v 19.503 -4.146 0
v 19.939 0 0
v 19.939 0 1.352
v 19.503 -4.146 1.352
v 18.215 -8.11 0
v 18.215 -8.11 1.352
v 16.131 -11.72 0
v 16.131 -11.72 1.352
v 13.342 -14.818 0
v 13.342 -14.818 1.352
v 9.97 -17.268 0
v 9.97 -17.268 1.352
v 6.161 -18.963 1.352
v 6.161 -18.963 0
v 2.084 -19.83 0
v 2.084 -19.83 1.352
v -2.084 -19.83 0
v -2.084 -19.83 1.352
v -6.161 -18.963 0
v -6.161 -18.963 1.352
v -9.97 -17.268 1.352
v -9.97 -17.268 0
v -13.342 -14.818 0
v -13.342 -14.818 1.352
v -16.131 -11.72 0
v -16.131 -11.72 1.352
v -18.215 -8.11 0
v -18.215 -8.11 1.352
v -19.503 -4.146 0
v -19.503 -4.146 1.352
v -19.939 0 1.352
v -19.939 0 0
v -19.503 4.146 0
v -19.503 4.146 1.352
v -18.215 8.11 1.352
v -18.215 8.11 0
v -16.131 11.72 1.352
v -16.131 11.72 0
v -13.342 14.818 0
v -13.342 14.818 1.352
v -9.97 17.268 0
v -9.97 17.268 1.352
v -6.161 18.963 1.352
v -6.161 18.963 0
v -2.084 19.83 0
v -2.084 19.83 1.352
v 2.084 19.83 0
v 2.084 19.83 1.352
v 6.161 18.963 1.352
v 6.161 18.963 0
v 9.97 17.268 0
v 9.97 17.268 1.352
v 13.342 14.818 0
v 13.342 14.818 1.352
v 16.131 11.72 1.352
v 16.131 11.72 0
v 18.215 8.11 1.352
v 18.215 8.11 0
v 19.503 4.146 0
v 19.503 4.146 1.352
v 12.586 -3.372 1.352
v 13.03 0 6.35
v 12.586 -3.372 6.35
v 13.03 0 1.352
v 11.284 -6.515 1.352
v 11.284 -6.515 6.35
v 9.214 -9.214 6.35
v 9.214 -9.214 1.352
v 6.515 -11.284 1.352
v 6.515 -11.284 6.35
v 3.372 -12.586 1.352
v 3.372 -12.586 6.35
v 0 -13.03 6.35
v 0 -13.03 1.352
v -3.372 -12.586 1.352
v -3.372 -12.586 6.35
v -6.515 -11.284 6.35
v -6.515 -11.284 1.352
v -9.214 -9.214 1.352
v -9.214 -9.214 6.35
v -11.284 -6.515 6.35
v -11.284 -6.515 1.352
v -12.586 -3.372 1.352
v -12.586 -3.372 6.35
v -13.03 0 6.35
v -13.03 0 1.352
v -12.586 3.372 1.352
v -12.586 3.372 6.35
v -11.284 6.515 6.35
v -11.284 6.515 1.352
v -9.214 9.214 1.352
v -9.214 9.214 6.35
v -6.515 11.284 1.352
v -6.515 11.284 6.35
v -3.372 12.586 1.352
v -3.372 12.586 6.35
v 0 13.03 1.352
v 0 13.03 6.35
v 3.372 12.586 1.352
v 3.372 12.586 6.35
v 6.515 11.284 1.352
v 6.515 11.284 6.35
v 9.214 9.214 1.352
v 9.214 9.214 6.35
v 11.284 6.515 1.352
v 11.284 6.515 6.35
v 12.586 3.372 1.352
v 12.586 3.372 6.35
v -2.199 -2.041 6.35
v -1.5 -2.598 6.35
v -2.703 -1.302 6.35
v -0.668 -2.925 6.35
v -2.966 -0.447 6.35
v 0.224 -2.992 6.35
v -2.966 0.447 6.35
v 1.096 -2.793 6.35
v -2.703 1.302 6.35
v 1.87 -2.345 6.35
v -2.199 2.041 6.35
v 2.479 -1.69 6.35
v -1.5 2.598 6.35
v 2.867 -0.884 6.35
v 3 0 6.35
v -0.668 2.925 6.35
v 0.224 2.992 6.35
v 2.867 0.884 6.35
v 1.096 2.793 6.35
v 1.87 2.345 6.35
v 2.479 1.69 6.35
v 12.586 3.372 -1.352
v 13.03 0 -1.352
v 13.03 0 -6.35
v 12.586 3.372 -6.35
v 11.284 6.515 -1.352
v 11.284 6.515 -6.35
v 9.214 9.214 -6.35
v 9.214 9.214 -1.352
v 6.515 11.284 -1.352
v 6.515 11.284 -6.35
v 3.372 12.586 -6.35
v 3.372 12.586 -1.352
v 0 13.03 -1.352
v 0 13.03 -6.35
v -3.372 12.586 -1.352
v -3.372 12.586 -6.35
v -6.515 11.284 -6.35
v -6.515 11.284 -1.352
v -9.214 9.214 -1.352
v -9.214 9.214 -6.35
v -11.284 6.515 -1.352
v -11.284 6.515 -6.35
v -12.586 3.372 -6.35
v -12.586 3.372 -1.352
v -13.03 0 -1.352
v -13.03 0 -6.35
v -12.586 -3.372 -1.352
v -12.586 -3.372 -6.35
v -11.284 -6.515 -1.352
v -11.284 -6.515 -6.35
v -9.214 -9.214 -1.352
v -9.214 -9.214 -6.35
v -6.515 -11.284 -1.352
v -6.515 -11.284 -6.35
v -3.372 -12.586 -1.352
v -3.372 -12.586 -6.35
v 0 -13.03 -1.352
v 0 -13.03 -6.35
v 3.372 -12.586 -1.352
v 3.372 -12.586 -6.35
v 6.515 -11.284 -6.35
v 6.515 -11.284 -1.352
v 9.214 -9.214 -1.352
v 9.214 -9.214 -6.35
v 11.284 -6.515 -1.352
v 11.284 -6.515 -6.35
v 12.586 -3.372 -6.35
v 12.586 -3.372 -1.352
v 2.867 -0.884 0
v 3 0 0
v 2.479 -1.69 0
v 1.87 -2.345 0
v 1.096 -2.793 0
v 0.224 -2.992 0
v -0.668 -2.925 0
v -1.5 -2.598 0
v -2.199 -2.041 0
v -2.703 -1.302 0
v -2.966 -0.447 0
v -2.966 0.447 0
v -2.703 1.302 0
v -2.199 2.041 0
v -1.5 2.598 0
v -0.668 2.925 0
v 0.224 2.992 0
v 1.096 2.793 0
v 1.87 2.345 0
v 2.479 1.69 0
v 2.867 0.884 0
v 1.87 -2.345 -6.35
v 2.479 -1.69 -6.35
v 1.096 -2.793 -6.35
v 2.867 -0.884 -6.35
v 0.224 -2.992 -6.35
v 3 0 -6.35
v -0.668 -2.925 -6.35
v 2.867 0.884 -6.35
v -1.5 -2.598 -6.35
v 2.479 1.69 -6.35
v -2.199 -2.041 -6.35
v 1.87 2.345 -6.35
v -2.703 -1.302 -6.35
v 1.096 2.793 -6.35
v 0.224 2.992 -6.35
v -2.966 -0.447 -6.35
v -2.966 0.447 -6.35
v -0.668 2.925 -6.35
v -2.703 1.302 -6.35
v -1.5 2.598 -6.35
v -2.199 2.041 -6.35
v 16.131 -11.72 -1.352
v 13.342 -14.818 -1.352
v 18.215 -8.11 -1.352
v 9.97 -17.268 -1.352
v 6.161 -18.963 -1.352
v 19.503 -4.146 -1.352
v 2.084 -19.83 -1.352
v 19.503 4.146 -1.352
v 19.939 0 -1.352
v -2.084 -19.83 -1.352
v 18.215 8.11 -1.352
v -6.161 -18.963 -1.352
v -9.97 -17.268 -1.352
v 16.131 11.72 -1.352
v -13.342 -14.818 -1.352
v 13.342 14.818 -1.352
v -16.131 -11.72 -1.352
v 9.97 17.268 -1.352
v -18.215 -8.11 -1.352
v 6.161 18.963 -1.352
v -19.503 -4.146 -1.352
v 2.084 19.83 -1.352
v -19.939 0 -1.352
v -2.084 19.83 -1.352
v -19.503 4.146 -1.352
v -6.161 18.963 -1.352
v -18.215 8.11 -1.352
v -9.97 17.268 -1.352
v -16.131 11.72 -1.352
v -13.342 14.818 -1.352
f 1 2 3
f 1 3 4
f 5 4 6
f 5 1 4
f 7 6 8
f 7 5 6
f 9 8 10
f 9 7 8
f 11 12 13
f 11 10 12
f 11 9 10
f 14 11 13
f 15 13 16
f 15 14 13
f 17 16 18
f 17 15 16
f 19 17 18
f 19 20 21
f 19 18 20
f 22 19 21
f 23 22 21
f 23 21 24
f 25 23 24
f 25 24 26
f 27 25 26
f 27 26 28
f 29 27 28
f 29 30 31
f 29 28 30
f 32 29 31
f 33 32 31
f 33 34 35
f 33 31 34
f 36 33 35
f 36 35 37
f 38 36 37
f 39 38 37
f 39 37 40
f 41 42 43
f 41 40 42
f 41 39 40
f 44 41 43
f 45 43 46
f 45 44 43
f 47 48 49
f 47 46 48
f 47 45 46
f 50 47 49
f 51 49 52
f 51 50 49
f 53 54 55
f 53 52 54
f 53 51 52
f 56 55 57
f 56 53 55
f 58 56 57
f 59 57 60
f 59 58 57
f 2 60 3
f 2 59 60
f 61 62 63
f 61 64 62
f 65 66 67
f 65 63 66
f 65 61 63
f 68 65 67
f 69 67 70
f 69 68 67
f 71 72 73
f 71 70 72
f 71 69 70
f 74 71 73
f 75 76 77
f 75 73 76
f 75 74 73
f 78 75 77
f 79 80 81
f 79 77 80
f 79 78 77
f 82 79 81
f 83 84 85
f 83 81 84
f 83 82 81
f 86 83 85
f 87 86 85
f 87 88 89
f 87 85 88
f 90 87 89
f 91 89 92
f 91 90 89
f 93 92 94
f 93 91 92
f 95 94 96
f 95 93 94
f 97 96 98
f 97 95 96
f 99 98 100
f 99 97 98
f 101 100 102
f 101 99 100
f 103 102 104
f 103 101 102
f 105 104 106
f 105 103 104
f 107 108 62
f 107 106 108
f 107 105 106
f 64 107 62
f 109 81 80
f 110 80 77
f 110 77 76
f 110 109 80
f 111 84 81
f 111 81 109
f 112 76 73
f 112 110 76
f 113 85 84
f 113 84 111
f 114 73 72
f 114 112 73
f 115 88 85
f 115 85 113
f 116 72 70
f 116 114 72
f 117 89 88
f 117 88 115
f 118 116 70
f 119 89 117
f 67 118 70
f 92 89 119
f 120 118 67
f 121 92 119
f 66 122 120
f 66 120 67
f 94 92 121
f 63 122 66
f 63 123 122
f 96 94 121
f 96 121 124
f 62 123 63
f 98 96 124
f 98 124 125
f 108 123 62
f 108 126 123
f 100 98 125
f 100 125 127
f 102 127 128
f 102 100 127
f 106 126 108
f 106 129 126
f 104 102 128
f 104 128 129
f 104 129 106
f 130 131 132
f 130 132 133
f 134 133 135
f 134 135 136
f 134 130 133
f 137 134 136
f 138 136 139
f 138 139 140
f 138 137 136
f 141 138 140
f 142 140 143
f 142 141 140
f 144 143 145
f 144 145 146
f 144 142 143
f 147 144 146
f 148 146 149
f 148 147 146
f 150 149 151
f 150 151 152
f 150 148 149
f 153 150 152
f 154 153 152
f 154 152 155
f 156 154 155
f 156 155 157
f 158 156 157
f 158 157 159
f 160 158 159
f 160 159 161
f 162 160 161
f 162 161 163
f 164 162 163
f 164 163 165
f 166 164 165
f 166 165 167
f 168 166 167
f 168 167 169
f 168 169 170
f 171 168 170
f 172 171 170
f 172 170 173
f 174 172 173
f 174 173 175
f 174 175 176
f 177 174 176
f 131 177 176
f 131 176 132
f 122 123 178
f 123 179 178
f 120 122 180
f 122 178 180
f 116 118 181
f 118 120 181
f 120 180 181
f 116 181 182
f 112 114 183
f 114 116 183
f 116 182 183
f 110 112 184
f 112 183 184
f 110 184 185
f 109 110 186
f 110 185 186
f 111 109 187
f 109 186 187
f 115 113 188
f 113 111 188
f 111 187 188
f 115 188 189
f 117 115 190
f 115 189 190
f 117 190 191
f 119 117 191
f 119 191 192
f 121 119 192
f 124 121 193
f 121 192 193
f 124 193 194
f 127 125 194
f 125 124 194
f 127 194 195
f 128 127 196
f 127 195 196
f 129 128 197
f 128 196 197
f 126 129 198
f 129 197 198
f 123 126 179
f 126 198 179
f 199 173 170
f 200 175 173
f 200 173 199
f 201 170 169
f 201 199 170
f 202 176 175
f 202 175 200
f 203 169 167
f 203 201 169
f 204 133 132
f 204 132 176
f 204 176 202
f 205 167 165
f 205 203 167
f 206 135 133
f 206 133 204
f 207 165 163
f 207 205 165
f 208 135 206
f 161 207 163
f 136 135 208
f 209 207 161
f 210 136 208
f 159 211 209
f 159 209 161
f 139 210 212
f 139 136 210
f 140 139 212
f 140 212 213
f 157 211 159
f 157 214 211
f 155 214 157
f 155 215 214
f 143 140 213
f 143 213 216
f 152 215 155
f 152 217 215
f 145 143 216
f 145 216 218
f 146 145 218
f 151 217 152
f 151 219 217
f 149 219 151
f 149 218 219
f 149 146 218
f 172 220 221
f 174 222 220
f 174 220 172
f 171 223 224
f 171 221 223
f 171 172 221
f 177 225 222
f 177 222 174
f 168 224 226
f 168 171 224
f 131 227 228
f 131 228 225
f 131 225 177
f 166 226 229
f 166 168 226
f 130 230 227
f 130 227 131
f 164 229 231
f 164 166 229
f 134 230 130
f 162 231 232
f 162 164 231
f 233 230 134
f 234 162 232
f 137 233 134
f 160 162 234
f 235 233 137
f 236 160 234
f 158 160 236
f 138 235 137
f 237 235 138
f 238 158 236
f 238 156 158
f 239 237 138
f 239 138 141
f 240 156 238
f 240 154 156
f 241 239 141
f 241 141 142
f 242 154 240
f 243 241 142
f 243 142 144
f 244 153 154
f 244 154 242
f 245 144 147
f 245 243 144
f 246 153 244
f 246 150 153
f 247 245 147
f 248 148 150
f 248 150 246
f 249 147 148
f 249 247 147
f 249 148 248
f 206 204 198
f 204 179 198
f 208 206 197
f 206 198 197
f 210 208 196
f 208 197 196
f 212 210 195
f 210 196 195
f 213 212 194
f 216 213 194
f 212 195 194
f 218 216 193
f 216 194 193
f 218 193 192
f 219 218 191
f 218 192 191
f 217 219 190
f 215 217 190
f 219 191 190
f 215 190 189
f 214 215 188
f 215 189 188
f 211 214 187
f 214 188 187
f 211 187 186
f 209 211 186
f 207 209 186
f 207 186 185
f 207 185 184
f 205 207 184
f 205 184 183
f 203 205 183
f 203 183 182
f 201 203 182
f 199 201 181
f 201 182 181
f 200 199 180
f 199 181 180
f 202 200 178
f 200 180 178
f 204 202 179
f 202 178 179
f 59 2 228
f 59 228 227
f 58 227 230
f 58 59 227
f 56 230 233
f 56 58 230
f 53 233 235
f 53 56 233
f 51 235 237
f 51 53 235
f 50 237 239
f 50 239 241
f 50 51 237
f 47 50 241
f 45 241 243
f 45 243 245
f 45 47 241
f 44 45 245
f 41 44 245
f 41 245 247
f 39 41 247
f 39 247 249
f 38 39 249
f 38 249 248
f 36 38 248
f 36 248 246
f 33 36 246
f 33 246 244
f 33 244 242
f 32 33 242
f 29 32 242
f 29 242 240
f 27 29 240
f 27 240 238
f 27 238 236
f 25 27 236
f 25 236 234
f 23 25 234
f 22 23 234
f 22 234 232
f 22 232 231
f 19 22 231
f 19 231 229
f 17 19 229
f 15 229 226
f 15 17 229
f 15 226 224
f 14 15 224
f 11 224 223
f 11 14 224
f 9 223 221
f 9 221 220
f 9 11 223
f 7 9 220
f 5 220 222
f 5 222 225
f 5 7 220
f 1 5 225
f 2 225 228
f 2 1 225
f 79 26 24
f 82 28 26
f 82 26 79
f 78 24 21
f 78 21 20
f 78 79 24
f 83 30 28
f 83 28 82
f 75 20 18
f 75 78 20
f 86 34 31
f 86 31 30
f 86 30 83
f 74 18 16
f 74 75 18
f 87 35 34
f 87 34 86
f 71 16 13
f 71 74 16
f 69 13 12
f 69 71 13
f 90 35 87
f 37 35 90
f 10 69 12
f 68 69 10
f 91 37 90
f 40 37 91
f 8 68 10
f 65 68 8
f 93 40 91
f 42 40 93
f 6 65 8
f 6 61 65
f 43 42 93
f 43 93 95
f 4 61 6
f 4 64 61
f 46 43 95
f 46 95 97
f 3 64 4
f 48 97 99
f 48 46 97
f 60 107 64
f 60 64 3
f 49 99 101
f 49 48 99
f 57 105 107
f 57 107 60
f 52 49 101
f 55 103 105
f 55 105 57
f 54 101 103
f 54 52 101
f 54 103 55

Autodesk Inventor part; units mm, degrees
ref_plane "YZ Plane" through (0, 0, 0) normal (1, 0, 0) x (0, 1, 0)
ref_plane "XZ Plane" through (0, 0, 0) normal (0, 1, 0) x (-1, 0, 0)
ref_plane "XY Plane" through (0, 0, 0) normal (0, 0, 1) x (1, 0, 0)
sketch "Sketch1" plane through (0, 0, 0) normal (0, 0, 1) x (1, 0, 0)
  circle A0 centre (0, 0) radius 13.0302
  circle A1 centre (0, 0) radius 3
  circle A2 centre (0, 0) radius 19.939
  dimension "d0" = 26.0604
  dimension "d1" = 6
  dimension "d2" = 39.878
extrude "Extrusion1" add sketch "Sketch1" along normal blind 6.35 contours A0
extrude "Extrusion2" add sketch "Sketch1" along normal blind 1.3525 contours A2
mirror "Mirror1" about plane through (0, 0, 0) normal (0, 0, -1)
properties part number "TensionerSprocket" material "Steel"
